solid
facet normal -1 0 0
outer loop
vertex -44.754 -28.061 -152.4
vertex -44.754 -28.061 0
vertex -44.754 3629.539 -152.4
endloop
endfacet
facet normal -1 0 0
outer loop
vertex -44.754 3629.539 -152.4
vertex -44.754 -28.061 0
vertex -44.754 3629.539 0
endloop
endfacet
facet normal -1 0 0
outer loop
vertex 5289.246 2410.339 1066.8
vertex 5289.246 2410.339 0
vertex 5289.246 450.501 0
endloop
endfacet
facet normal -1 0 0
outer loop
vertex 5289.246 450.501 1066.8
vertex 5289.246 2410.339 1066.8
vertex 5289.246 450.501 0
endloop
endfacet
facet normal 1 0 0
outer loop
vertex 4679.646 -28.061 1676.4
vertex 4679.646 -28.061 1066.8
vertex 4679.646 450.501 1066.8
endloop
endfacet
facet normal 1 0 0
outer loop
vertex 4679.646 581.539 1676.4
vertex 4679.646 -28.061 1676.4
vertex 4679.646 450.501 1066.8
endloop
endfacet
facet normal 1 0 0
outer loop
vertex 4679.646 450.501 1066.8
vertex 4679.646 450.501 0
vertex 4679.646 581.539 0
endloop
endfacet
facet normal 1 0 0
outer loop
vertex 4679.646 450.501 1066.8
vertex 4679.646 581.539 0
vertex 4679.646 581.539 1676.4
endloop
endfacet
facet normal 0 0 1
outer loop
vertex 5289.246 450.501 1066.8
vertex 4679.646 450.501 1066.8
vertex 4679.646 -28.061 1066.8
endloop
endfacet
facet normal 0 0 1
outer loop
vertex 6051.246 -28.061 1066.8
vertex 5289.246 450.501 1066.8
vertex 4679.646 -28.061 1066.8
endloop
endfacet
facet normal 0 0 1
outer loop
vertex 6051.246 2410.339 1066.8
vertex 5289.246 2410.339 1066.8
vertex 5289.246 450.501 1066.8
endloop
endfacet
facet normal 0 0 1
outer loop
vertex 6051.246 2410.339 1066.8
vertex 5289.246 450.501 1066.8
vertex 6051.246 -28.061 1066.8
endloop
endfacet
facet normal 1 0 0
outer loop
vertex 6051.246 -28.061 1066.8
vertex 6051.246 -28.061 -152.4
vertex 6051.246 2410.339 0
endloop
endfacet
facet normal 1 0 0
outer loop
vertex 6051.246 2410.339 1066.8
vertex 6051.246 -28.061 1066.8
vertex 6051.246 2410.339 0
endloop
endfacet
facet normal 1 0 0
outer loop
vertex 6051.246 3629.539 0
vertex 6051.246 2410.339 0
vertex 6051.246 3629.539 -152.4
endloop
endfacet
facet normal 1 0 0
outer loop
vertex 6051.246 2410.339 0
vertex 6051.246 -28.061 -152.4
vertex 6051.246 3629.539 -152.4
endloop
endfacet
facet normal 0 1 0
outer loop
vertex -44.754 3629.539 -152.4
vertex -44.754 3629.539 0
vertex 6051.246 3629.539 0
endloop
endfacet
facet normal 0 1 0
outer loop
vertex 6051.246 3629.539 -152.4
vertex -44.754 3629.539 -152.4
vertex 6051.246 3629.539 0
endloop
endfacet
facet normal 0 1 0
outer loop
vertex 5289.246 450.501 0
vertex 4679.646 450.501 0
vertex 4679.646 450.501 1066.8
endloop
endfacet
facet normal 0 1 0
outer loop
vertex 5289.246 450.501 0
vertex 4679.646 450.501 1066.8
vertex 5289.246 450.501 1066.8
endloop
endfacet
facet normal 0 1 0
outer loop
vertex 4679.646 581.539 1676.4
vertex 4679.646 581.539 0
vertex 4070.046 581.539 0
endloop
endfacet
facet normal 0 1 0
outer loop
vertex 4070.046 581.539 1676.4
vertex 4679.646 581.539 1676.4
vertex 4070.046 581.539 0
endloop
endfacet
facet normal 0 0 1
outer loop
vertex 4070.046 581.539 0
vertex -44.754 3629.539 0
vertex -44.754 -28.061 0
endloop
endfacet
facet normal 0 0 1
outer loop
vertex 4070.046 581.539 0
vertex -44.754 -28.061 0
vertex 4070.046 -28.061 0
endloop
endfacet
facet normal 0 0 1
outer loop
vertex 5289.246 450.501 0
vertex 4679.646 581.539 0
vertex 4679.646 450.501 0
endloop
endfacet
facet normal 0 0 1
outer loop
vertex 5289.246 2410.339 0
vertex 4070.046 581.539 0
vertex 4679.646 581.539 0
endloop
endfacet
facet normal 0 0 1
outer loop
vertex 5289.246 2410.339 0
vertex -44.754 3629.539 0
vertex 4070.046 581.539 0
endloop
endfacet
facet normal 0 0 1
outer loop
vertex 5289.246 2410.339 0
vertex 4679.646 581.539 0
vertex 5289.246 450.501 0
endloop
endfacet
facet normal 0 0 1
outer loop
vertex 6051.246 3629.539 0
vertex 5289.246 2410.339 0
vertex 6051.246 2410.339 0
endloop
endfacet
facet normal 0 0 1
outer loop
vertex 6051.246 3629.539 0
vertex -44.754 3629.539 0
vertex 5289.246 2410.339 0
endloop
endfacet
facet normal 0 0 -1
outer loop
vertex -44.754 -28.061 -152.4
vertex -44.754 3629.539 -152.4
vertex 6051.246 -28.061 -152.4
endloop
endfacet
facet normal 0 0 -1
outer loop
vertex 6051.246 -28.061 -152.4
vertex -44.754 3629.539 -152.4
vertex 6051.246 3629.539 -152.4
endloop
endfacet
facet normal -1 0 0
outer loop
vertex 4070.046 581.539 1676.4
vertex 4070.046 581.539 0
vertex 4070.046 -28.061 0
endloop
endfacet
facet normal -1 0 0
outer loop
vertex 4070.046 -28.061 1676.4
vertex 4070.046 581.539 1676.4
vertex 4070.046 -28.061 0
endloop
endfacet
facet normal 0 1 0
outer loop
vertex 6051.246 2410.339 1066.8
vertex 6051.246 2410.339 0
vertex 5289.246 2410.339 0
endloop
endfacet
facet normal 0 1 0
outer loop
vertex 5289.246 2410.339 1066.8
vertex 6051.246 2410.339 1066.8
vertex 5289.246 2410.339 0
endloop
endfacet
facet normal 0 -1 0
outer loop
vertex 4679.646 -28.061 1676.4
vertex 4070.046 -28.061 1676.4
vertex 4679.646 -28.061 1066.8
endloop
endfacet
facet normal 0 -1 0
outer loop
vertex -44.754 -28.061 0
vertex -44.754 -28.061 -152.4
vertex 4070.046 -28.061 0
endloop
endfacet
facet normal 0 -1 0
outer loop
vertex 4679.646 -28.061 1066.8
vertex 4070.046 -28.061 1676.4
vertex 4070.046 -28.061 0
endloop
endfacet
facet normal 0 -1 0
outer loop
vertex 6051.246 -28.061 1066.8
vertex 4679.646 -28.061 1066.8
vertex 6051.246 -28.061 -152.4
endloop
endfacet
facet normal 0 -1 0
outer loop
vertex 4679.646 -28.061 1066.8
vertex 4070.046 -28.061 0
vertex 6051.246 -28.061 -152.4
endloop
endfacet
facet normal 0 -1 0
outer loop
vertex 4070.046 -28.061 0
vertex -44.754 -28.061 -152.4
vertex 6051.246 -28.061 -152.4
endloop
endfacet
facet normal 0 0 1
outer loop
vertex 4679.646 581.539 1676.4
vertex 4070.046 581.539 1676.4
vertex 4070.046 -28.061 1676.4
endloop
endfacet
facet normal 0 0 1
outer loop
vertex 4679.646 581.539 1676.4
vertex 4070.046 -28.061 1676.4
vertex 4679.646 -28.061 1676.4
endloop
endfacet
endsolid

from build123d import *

# Parameters (mm, degrees)
F0_W     = 6096
F0_H     = 3657.6
F1_DEPTH = 152.4
F2_W     = 609.6
F2_H     = 478.562504
F3_DEPTH = 1066.8
F4_DEPTH = 1676.4


with BuildPart() as f1:
    # F0 (on Top) → F1 (new body)
    with BuildSketch(Plane.XY):
        with Locations((3003.246203, 1800.738938)):
            Rectangle(F0_W, F0_H)
    extrude(amount=-F1_DEPTH)

    # F2 (on face) → F3 (join)
    with BuildSketch(Plane.XY):
        Polygon((6051.246203, -28.061062), (6051.246203, 2410.338938), (5289.246203, 2410.338938), (5289.246203, 450.501442), (5289.246203, -28.061062), align=None)
        with Locations((4984.446203, 211.22019)):
            Rectangle(F2_W, F2_H)
    extrude(amount=F3_DEPTH)

    # F2 (on face) → F4 (join)
    with BuildSketch(Plane.XY):
        Polygon((4070.046203, 581.538938), (4070.046203, -28.061062), (4679.646203, -28.061062), (4679.646203, 450.501442), (4679.646203, 581.538938), align=None)
    extrude(amount=F4_DEPTH)


solid = f1.part
